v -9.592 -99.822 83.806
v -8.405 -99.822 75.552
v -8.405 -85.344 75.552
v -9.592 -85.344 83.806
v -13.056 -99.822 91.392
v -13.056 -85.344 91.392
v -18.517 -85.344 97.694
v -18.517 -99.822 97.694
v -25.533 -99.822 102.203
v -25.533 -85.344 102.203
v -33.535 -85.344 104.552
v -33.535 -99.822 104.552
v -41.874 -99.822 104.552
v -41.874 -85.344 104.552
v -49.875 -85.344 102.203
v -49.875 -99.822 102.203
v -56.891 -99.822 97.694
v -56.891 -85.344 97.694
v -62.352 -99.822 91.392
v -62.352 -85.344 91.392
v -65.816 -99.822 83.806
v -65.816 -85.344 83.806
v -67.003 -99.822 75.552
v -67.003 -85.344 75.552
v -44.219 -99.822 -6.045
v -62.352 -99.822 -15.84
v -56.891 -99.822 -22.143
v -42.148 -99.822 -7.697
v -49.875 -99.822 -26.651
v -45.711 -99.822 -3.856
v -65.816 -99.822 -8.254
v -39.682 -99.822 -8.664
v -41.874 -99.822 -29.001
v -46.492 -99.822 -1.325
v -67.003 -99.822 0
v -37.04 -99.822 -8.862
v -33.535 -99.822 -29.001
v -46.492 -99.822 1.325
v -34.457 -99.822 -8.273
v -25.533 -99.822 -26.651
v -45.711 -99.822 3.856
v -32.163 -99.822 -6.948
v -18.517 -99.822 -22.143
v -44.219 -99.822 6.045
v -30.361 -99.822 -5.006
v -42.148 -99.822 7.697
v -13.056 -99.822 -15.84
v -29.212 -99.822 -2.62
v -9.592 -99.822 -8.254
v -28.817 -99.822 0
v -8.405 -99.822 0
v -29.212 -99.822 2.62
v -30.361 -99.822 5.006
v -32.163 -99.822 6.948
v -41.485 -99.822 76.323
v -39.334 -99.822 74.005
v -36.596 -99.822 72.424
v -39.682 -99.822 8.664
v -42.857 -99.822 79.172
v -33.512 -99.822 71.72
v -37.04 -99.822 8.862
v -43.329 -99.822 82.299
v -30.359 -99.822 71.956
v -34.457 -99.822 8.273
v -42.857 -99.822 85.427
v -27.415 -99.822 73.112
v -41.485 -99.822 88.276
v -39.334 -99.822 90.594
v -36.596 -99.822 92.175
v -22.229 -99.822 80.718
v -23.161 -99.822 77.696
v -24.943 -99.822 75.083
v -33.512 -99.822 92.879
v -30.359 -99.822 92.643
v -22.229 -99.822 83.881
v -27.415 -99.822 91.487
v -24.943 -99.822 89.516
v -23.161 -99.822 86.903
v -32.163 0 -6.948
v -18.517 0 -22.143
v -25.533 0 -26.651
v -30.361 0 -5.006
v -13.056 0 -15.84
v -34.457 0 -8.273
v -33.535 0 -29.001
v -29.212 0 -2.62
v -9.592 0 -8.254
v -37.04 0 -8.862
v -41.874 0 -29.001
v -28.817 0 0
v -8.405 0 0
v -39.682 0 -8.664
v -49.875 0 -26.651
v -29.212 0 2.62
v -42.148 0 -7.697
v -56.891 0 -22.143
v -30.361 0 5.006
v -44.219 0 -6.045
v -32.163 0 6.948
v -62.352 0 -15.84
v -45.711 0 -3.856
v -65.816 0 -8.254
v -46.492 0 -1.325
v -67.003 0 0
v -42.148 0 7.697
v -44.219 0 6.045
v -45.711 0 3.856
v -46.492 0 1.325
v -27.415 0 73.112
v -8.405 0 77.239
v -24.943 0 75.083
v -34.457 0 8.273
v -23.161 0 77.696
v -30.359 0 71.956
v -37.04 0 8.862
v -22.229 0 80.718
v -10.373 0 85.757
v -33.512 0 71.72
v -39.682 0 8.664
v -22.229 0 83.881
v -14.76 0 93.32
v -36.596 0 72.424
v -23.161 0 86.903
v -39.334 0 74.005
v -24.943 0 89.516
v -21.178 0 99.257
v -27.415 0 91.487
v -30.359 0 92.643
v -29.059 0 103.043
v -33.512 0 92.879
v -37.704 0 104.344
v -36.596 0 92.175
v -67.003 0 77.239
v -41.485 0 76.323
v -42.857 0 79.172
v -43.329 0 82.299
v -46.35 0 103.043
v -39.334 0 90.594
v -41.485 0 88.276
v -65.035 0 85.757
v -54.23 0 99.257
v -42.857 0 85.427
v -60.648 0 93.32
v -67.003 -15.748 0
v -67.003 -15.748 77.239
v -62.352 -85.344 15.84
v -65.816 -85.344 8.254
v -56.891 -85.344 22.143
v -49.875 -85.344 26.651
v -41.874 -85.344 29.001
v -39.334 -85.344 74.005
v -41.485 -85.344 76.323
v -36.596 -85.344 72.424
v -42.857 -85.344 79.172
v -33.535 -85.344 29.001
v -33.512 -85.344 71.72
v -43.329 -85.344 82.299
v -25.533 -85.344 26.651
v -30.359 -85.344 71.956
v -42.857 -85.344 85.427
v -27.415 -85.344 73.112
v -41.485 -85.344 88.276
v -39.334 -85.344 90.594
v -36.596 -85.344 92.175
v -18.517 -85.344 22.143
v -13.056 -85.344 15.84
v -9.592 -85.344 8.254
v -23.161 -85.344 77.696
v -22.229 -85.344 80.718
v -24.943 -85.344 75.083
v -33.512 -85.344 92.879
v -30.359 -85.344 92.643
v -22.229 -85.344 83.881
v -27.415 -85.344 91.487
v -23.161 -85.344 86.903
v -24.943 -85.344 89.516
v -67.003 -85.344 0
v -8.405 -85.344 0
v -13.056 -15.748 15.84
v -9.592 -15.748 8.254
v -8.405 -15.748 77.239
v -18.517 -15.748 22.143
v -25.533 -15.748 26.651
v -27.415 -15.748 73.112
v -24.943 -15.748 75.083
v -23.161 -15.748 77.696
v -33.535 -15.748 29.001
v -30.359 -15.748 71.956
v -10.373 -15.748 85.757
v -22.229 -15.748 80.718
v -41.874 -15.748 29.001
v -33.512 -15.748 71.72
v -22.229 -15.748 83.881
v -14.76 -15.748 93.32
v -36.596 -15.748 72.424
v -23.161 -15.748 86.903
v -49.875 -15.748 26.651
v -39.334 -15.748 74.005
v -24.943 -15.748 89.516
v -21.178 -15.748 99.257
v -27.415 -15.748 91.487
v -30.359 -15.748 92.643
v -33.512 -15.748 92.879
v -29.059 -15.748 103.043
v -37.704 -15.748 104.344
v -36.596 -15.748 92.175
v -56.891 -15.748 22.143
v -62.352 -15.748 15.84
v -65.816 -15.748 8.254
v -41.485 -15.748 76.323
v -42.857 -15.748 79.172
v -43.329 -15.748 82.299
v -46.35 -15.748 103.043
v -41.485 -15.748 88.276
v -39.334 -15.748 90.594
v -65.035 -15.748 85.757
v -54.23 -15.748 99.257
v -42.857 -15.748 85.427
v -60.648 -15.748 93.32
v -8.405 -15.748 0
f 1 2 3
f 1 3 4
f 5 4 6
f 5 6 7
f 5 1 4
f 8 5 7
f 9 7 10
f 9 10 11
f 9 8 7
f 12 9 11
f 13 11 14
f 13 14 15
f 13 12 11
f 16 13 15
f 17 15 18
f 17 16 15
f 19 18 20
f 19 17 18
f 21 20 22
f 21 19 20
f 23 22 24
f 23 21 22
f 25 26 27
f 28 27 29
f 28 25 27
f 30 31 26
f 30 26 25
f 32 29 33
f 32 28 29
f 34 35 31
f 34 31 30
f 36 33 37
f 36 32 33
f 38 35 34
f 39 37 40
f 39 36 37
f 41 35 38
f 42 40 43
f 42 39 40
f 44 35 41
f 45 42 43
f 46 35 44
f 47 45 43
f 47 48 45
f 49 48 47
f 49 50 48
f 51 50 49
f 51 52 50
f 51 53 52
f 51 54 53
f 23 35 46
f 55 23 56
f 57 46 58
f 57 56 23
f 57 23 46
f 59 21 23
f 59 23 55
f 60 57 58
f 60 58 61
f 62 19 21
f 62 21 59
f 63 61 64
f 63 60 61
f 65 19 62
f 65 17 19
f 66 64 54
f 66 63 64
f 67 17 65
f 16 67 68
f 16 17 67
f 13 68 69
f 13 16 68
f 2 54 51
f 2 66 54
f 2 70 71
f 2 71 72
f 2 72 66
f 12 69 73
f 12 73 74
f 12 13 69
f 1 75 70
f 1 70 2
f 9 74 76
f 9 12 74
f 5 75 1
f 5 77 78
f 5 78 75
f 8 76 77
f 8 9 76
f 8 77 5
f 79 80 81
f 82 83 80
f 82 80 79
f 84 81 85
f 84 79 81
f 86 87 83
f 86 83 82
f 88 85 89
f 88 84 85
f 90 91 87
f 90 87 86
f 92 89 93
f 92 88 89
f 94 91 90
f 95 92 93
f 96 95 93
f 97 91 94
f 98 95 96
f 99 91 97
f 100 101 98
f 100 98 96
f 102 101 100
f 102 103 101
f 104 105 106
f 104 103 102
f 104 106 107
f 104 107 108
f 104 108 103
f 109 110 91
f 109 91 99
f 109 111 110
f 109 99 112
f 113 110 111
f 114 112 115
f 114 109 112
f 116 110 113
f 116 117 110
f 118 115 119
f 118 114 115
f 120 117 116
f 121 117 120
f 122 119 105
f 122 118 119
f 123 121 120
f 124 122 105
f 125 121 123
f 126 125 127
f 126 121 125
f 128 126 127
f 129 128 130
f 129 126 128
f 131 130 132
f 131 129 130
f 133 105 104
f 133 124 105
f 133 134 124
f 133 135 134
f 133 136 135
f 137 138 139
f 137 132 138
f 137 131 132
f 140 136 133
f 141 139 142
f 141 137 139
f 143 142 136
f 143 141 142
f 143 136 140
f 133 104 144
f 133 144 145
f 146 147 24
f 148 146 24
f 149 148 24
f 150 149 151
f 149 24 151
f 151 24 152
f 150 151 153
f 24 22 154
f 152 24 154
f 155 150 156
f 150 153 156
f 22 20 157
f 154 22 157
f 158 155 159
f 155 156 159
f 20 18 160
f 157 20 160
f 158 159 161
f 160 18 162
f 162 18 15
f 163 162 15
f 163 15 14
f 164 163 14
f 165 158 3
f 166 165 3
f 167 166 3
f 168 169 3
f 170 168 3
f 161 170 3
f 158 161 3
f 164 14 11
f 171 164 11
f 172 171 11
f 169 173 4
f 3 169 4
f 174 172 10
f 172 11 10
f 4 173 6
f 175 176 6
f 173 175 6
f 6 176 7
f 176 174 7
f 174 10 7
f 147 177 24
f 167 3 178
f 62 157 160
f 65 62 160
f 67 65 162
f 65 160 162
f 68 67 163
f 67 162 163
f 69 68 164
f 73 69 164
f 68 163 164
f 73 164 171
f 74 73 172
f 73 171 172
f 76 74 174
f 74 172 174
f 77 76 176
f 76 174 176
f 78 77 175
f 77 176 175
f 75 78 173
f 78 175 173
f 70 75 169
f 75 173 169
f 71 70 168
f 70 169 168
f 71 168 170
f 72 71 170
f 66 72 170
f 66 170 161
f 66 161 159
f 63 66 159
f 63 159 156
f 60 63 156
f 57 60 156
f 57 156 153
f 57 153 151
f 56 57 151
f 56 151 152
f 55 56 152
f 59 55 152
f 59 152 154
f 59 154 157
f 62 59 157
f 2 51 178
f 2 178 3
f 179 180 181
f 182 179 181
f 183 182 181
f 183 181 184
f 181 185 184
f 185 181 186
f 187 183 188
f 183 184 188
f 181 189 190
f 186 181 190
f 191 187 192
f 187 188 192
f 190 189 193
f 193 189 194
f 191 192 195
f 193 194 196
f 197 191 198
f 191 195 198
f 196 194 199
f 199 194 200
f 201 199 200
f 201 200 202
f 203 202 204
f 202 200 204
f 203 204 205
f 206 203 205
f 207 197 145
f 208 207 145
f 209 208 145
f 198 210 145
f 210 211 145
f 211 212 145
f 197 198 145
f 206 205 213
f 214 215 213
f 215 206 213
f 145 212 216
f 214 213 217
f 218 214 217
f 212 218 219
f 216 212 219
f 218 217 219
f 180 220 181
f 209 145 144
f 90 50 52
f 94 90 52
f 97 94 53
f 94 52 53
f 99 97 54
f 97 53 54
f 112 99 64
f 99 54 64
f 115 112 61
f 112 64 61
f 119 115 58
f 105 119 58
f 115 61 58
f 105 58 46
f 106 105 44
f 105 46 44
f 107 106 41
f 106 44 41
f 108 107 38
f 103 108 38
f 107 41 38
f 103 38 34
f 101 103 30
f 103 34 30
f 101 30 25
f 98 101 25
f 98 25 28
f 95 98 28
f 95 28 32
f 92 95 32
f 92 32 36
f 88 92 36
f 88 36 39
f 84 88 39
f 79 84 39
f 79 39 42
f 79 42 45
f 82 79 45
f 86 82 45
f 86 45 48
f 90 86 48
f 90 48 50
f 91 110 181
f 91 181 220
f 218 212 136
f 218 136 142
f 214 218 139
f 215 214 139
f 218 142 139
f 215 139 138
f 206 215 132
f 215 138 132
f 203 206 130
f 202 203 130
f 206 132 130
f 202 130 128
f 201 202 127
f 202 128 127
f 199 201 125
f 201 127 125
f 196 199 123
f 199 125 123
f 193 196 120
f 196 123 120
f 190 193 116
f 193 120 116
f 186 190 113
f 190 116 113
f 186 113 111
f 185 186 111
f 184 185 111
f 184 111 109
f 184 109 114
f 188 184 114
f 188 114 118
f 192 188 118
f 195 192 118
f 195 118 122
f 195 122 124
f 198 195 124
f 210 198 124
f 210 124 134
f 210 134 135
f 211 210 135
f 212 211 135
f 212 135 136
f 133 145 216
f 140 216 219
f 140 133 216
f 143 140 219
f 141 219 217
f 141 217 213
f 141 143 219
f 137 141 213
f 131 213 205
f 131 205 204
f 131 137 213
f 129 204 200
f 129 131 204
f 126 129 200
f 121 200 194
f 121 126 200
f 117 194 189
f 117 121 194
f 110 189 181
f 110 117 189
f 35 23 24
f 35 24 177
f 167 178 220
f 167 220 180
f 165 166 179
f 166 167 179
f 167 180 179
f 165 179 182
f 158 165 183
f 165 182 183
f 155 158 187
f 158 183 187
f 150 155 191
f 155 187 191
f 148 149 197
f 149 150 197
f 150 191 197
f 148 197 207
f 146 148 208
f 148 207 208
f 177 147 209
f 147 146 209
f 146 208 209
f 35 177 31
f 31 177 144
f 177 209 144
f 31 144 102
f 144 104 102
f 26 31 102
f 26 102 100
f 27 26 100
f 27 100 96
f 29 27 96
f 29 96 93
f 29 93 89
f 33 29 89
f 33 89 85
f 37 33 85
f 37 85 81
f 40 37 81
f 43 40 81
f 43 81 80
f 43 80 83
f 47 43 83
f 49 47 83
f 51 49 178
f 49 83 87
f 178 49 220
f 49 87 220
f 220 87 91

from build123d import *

# Parameters (mm, degrees)
F0_R     = 29.2989433696
F1_DEPTH = 99.822
F2_R     = 8.887223807
F3_DEPTH = 120.904
F5_DEPTH = 14.478
F7_DEPTH = 15.748
F8_R     = 10.6092029908
F9_DEPTH = 149.352


with BuildPart() as f1:
    # F0 (on Front) → F1 (new body)
    with BuildSketch(Plane.XZ):
        with Locations((-37.7041958272, 0)):
            Circle(F0_R)
    extrude(amount=F1_DEPTH)

    # F2 (on face) → F3 (cut)
    with BuildSketch(Plane.XZ.offset(99.822)):
        with Locations((-37.7041958272, 0)):
            Circle(F2_R)
    extrude(amount=-F3_DEPTH, mode=Mode.SUBTRACT)

    # F4 (on face) → F5 (join)
    with BuildSketch(Plane.XZ.offset(99.822)):
        with BuildLine():
            Line((-67.0031391968, 75.5516141653), (-67.0031391968, 0))
            ThreePointArc((-67.0031391968, 0), (-37.7041958272, 29.2989433696), (-8.4052524577, 0))
            Line((-8.4052524577, 0), (-8.4052524577, 75.5516141653))
            ThreePointArc((-8.4052524577, 75.5516141653), (-37.7041958272, 104.8505575349), (-67.0031391968, 75.5516141653))
        make_face()
    extrude(amount=-F5_DEPTH)

    # F6 (on face) → F7 (join)
    with BuildSketch(Plane(origin=(0, 0, 0), x_dir=(-1, 0, 0), z_dir=(0, 1, 0))):
        with BuildLine():
            Line((8.4052524577, 77.2385671735), (8.4052524577, 0))
            ThreePointArc((8.4052524577, 0), (37.7041958272, 29.2989433696), (67.0031391968, 0))
            Line((67.0031391968, 0), (67.0031391968, 77.2385671735))
            ThreePointArc((67.0031391968, 77.2385671735), (37.7041958272, 104.3438807805), (8.4052524577, 77.2385671735))
        make_face()
    extrude(amount=-F7_DEPTH)

    # F8 (on face) → F9 (cut)
    with BuildSketch(Plane(origin=(0, 0, 0), x_dir=(-1, 0, 0), z_dir=(0, 1, 0))):
        with Locations((32.7196232975, 82.2994410992)):
            Circle(F8_R)
    extrude(amount=-F9_DEPTH, mode=Mode.SUBTRACT)


solid = f1.part
